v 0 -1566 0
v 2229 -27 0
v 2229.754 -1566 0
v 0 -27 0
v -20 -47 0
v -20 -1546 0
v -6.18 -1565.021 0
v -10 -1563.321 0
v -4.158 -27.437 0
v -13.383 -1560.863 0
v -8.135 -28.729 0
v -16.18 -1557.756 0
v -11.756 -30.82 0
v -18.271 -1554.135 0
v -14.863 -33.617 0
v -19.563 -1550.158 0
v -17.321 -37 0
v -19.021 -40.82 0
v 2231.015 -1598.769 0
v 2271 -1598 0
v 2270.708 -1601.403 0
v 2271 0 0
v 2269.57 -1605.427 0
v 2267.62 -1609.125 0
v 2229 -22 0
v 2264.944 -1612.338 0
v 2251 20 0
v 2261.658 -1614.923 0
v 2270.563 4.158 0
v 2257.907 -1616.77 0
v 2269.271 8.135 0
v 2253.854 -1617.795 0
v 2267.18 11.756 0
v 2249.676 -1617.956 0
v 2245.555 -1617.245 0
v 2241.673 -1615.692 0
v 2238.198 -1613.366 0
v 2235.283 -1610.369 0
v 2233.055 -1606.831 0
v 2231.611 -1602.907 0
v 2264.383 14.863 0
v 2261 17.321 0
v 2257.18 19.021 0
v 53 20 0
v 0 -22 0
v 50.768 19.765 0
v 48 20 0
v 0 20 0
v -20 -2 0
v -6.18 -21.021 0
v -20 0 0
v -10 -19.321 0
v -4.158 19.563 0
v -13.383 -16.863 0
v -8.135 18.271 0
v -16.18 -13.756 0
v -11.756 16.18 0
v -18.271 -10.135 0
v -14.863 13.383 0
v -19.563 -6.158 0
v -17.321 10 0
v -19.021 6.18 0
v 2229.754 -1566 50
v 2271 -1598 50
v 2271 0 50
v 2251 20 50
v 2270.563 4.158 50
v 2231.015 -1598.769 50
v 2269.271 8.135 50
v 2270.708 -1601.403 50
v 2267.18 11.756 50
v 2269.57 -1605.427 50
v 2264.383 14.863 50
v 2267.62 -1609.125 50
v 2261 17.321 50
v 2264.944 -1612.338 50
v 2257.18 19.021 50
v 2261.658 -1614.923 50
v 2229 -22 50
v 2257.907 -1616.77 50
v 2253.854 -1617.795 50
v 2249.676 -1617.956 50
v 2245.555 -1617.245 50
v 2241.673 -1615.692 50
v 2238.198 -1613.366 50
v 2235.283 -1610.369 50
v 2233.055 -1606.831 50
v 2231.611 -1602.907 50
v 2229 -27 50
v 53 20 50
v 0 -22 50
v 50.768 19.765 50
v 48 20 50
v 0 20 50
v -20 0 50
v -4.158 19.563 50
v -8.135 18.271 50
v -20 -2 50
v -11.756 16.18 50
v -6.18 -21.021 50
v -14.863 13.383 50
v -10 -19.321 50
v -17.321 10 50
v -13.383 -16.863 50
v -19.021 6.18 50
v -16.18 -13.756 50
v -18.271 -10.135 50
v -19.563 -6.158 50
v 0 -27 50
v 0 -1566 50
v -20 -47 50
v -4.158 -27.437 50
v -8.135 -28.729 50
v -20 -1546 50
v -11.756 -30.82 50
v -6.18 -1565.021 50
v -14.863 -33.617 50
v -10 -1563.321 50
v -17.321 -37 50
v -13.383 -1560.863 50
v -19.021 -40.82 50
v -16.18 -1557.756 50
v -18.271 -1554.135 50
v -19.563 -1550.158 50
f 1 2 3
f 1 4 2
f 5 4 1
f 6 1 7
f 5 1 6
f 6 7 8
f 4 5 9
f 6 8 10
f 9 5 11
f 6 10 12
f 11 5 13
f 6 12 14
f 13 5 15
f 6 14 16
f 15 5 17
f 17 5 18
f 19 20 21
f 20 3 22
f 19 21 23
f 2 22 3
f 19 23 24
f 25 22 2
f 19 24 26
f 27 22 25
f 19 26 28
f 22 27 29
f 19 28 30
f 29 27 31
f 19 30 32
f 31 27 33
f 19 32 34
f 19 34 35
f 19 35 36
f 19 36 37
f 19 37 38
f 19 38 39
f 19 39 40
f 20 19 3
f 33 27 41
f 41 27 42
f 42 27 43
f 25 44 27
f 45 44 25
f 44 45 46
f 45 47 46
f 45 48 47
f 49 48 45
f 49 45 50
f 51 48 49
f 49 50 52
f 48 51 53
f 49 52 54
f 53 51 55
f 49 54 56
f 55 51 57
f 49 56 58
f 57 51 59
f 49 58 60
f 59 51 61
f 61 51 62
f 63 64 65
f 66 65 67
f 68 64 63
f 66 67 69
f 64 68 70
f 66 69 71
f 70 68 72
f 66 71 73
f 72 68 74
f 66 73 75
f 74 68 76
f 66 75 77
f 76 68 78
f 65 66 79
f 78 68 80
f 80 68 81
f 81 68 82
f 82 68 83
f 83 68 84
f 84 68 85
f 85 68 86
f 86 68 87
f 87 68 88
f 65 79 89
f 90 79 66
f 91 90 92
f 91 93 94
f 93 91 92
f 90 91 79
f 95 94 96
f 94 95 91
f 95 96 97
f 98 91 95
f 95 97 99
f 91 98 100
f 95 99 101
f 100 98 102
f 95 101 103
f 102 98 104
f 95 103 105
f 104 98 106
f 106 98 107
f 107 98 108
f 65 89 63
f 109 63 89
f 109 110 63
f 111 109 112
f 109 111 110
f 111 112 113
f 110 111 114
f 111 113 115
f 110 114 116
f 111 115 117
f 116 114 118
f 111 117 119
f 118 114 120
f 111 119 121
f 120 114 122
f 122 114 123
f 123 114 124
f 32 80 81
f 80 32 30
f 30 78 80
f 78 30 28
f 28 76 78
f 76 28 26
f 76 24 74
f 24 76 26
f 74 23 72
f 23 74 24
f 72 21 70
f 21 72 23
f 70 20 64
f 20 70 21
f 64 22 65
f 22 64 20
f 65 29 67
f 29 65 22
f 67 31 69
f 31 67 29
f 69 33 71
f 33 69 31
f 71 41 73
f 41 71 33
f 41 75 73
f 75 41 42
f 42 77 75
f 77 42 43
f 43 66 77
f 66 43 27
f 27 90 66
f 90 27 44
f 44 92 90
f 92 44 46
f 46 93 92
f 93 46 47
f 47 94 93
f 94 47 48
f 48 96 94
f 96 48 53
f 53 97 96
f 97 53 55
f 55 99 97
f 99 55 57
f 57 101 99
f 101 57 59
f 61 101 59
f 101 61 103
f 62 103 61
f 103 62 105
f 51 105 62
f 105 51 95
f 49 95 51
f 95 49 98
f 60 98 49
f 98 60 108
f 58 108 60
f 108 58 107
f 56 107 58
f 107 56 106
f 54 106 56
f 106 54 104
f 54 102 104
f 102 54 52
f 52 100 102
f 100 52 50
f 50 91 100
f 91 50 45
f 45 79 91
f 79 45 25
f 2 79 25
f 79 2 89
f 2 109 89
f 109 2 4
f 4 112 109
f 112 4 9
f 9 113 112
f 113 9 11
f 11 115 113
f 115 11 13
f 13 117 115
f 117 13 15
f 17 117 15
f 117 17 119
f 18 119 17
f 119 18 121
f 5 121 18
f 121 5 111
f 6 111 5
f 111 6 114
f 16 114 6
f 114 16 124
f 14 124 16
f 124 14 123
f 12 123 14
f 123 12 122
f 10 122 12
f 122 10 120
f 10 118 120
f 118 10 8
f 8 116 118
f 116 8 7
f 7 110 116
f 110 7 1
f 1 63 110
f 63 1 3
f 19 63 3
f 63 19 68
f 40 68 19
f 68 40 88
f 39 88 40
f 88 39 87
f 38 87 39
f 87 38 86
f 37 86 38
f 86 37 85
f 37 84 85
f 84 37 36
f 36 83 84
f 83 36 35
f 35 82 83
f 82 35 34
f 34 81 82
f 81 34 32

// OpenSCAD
// ==================================================
// EYEOVERTHINK: BOUNDARY MANIFESTATION ENGINE
// Translating Scott Vectors to Physical Matter
// ==================================================

// --- Your Data (Already in your file) ---
scott_points = [[0, 0], [0, -2], [2249, -2], [2249, -47], [0, -47], [0, -1546], [2249, -1546], [2251, -1598], [2251, 0], [53, 0], [51, -2], [48, 0]];

// --- Engineering Constants ---
wall_thickness = 20; 
sign_height = 50;
base_thickness = 5;

// --- Stage 1: Boundary Manifestation (Φ) ---
// This turns the 1D vectors into a 3D hollow shell
difference() {
    // 1. External Perimeter (∂S + Wall)
    linear_extrude(height = sign_height)
        offset(r = wall_thickness)
        polygon(points = scott_points);

    // 2. Internal Light Channel (The Inverse)
    translate([0, 0, base_thickness])
        linear_extrude(height = sign_height + 1)
        polygon(points = scott_points);
}
